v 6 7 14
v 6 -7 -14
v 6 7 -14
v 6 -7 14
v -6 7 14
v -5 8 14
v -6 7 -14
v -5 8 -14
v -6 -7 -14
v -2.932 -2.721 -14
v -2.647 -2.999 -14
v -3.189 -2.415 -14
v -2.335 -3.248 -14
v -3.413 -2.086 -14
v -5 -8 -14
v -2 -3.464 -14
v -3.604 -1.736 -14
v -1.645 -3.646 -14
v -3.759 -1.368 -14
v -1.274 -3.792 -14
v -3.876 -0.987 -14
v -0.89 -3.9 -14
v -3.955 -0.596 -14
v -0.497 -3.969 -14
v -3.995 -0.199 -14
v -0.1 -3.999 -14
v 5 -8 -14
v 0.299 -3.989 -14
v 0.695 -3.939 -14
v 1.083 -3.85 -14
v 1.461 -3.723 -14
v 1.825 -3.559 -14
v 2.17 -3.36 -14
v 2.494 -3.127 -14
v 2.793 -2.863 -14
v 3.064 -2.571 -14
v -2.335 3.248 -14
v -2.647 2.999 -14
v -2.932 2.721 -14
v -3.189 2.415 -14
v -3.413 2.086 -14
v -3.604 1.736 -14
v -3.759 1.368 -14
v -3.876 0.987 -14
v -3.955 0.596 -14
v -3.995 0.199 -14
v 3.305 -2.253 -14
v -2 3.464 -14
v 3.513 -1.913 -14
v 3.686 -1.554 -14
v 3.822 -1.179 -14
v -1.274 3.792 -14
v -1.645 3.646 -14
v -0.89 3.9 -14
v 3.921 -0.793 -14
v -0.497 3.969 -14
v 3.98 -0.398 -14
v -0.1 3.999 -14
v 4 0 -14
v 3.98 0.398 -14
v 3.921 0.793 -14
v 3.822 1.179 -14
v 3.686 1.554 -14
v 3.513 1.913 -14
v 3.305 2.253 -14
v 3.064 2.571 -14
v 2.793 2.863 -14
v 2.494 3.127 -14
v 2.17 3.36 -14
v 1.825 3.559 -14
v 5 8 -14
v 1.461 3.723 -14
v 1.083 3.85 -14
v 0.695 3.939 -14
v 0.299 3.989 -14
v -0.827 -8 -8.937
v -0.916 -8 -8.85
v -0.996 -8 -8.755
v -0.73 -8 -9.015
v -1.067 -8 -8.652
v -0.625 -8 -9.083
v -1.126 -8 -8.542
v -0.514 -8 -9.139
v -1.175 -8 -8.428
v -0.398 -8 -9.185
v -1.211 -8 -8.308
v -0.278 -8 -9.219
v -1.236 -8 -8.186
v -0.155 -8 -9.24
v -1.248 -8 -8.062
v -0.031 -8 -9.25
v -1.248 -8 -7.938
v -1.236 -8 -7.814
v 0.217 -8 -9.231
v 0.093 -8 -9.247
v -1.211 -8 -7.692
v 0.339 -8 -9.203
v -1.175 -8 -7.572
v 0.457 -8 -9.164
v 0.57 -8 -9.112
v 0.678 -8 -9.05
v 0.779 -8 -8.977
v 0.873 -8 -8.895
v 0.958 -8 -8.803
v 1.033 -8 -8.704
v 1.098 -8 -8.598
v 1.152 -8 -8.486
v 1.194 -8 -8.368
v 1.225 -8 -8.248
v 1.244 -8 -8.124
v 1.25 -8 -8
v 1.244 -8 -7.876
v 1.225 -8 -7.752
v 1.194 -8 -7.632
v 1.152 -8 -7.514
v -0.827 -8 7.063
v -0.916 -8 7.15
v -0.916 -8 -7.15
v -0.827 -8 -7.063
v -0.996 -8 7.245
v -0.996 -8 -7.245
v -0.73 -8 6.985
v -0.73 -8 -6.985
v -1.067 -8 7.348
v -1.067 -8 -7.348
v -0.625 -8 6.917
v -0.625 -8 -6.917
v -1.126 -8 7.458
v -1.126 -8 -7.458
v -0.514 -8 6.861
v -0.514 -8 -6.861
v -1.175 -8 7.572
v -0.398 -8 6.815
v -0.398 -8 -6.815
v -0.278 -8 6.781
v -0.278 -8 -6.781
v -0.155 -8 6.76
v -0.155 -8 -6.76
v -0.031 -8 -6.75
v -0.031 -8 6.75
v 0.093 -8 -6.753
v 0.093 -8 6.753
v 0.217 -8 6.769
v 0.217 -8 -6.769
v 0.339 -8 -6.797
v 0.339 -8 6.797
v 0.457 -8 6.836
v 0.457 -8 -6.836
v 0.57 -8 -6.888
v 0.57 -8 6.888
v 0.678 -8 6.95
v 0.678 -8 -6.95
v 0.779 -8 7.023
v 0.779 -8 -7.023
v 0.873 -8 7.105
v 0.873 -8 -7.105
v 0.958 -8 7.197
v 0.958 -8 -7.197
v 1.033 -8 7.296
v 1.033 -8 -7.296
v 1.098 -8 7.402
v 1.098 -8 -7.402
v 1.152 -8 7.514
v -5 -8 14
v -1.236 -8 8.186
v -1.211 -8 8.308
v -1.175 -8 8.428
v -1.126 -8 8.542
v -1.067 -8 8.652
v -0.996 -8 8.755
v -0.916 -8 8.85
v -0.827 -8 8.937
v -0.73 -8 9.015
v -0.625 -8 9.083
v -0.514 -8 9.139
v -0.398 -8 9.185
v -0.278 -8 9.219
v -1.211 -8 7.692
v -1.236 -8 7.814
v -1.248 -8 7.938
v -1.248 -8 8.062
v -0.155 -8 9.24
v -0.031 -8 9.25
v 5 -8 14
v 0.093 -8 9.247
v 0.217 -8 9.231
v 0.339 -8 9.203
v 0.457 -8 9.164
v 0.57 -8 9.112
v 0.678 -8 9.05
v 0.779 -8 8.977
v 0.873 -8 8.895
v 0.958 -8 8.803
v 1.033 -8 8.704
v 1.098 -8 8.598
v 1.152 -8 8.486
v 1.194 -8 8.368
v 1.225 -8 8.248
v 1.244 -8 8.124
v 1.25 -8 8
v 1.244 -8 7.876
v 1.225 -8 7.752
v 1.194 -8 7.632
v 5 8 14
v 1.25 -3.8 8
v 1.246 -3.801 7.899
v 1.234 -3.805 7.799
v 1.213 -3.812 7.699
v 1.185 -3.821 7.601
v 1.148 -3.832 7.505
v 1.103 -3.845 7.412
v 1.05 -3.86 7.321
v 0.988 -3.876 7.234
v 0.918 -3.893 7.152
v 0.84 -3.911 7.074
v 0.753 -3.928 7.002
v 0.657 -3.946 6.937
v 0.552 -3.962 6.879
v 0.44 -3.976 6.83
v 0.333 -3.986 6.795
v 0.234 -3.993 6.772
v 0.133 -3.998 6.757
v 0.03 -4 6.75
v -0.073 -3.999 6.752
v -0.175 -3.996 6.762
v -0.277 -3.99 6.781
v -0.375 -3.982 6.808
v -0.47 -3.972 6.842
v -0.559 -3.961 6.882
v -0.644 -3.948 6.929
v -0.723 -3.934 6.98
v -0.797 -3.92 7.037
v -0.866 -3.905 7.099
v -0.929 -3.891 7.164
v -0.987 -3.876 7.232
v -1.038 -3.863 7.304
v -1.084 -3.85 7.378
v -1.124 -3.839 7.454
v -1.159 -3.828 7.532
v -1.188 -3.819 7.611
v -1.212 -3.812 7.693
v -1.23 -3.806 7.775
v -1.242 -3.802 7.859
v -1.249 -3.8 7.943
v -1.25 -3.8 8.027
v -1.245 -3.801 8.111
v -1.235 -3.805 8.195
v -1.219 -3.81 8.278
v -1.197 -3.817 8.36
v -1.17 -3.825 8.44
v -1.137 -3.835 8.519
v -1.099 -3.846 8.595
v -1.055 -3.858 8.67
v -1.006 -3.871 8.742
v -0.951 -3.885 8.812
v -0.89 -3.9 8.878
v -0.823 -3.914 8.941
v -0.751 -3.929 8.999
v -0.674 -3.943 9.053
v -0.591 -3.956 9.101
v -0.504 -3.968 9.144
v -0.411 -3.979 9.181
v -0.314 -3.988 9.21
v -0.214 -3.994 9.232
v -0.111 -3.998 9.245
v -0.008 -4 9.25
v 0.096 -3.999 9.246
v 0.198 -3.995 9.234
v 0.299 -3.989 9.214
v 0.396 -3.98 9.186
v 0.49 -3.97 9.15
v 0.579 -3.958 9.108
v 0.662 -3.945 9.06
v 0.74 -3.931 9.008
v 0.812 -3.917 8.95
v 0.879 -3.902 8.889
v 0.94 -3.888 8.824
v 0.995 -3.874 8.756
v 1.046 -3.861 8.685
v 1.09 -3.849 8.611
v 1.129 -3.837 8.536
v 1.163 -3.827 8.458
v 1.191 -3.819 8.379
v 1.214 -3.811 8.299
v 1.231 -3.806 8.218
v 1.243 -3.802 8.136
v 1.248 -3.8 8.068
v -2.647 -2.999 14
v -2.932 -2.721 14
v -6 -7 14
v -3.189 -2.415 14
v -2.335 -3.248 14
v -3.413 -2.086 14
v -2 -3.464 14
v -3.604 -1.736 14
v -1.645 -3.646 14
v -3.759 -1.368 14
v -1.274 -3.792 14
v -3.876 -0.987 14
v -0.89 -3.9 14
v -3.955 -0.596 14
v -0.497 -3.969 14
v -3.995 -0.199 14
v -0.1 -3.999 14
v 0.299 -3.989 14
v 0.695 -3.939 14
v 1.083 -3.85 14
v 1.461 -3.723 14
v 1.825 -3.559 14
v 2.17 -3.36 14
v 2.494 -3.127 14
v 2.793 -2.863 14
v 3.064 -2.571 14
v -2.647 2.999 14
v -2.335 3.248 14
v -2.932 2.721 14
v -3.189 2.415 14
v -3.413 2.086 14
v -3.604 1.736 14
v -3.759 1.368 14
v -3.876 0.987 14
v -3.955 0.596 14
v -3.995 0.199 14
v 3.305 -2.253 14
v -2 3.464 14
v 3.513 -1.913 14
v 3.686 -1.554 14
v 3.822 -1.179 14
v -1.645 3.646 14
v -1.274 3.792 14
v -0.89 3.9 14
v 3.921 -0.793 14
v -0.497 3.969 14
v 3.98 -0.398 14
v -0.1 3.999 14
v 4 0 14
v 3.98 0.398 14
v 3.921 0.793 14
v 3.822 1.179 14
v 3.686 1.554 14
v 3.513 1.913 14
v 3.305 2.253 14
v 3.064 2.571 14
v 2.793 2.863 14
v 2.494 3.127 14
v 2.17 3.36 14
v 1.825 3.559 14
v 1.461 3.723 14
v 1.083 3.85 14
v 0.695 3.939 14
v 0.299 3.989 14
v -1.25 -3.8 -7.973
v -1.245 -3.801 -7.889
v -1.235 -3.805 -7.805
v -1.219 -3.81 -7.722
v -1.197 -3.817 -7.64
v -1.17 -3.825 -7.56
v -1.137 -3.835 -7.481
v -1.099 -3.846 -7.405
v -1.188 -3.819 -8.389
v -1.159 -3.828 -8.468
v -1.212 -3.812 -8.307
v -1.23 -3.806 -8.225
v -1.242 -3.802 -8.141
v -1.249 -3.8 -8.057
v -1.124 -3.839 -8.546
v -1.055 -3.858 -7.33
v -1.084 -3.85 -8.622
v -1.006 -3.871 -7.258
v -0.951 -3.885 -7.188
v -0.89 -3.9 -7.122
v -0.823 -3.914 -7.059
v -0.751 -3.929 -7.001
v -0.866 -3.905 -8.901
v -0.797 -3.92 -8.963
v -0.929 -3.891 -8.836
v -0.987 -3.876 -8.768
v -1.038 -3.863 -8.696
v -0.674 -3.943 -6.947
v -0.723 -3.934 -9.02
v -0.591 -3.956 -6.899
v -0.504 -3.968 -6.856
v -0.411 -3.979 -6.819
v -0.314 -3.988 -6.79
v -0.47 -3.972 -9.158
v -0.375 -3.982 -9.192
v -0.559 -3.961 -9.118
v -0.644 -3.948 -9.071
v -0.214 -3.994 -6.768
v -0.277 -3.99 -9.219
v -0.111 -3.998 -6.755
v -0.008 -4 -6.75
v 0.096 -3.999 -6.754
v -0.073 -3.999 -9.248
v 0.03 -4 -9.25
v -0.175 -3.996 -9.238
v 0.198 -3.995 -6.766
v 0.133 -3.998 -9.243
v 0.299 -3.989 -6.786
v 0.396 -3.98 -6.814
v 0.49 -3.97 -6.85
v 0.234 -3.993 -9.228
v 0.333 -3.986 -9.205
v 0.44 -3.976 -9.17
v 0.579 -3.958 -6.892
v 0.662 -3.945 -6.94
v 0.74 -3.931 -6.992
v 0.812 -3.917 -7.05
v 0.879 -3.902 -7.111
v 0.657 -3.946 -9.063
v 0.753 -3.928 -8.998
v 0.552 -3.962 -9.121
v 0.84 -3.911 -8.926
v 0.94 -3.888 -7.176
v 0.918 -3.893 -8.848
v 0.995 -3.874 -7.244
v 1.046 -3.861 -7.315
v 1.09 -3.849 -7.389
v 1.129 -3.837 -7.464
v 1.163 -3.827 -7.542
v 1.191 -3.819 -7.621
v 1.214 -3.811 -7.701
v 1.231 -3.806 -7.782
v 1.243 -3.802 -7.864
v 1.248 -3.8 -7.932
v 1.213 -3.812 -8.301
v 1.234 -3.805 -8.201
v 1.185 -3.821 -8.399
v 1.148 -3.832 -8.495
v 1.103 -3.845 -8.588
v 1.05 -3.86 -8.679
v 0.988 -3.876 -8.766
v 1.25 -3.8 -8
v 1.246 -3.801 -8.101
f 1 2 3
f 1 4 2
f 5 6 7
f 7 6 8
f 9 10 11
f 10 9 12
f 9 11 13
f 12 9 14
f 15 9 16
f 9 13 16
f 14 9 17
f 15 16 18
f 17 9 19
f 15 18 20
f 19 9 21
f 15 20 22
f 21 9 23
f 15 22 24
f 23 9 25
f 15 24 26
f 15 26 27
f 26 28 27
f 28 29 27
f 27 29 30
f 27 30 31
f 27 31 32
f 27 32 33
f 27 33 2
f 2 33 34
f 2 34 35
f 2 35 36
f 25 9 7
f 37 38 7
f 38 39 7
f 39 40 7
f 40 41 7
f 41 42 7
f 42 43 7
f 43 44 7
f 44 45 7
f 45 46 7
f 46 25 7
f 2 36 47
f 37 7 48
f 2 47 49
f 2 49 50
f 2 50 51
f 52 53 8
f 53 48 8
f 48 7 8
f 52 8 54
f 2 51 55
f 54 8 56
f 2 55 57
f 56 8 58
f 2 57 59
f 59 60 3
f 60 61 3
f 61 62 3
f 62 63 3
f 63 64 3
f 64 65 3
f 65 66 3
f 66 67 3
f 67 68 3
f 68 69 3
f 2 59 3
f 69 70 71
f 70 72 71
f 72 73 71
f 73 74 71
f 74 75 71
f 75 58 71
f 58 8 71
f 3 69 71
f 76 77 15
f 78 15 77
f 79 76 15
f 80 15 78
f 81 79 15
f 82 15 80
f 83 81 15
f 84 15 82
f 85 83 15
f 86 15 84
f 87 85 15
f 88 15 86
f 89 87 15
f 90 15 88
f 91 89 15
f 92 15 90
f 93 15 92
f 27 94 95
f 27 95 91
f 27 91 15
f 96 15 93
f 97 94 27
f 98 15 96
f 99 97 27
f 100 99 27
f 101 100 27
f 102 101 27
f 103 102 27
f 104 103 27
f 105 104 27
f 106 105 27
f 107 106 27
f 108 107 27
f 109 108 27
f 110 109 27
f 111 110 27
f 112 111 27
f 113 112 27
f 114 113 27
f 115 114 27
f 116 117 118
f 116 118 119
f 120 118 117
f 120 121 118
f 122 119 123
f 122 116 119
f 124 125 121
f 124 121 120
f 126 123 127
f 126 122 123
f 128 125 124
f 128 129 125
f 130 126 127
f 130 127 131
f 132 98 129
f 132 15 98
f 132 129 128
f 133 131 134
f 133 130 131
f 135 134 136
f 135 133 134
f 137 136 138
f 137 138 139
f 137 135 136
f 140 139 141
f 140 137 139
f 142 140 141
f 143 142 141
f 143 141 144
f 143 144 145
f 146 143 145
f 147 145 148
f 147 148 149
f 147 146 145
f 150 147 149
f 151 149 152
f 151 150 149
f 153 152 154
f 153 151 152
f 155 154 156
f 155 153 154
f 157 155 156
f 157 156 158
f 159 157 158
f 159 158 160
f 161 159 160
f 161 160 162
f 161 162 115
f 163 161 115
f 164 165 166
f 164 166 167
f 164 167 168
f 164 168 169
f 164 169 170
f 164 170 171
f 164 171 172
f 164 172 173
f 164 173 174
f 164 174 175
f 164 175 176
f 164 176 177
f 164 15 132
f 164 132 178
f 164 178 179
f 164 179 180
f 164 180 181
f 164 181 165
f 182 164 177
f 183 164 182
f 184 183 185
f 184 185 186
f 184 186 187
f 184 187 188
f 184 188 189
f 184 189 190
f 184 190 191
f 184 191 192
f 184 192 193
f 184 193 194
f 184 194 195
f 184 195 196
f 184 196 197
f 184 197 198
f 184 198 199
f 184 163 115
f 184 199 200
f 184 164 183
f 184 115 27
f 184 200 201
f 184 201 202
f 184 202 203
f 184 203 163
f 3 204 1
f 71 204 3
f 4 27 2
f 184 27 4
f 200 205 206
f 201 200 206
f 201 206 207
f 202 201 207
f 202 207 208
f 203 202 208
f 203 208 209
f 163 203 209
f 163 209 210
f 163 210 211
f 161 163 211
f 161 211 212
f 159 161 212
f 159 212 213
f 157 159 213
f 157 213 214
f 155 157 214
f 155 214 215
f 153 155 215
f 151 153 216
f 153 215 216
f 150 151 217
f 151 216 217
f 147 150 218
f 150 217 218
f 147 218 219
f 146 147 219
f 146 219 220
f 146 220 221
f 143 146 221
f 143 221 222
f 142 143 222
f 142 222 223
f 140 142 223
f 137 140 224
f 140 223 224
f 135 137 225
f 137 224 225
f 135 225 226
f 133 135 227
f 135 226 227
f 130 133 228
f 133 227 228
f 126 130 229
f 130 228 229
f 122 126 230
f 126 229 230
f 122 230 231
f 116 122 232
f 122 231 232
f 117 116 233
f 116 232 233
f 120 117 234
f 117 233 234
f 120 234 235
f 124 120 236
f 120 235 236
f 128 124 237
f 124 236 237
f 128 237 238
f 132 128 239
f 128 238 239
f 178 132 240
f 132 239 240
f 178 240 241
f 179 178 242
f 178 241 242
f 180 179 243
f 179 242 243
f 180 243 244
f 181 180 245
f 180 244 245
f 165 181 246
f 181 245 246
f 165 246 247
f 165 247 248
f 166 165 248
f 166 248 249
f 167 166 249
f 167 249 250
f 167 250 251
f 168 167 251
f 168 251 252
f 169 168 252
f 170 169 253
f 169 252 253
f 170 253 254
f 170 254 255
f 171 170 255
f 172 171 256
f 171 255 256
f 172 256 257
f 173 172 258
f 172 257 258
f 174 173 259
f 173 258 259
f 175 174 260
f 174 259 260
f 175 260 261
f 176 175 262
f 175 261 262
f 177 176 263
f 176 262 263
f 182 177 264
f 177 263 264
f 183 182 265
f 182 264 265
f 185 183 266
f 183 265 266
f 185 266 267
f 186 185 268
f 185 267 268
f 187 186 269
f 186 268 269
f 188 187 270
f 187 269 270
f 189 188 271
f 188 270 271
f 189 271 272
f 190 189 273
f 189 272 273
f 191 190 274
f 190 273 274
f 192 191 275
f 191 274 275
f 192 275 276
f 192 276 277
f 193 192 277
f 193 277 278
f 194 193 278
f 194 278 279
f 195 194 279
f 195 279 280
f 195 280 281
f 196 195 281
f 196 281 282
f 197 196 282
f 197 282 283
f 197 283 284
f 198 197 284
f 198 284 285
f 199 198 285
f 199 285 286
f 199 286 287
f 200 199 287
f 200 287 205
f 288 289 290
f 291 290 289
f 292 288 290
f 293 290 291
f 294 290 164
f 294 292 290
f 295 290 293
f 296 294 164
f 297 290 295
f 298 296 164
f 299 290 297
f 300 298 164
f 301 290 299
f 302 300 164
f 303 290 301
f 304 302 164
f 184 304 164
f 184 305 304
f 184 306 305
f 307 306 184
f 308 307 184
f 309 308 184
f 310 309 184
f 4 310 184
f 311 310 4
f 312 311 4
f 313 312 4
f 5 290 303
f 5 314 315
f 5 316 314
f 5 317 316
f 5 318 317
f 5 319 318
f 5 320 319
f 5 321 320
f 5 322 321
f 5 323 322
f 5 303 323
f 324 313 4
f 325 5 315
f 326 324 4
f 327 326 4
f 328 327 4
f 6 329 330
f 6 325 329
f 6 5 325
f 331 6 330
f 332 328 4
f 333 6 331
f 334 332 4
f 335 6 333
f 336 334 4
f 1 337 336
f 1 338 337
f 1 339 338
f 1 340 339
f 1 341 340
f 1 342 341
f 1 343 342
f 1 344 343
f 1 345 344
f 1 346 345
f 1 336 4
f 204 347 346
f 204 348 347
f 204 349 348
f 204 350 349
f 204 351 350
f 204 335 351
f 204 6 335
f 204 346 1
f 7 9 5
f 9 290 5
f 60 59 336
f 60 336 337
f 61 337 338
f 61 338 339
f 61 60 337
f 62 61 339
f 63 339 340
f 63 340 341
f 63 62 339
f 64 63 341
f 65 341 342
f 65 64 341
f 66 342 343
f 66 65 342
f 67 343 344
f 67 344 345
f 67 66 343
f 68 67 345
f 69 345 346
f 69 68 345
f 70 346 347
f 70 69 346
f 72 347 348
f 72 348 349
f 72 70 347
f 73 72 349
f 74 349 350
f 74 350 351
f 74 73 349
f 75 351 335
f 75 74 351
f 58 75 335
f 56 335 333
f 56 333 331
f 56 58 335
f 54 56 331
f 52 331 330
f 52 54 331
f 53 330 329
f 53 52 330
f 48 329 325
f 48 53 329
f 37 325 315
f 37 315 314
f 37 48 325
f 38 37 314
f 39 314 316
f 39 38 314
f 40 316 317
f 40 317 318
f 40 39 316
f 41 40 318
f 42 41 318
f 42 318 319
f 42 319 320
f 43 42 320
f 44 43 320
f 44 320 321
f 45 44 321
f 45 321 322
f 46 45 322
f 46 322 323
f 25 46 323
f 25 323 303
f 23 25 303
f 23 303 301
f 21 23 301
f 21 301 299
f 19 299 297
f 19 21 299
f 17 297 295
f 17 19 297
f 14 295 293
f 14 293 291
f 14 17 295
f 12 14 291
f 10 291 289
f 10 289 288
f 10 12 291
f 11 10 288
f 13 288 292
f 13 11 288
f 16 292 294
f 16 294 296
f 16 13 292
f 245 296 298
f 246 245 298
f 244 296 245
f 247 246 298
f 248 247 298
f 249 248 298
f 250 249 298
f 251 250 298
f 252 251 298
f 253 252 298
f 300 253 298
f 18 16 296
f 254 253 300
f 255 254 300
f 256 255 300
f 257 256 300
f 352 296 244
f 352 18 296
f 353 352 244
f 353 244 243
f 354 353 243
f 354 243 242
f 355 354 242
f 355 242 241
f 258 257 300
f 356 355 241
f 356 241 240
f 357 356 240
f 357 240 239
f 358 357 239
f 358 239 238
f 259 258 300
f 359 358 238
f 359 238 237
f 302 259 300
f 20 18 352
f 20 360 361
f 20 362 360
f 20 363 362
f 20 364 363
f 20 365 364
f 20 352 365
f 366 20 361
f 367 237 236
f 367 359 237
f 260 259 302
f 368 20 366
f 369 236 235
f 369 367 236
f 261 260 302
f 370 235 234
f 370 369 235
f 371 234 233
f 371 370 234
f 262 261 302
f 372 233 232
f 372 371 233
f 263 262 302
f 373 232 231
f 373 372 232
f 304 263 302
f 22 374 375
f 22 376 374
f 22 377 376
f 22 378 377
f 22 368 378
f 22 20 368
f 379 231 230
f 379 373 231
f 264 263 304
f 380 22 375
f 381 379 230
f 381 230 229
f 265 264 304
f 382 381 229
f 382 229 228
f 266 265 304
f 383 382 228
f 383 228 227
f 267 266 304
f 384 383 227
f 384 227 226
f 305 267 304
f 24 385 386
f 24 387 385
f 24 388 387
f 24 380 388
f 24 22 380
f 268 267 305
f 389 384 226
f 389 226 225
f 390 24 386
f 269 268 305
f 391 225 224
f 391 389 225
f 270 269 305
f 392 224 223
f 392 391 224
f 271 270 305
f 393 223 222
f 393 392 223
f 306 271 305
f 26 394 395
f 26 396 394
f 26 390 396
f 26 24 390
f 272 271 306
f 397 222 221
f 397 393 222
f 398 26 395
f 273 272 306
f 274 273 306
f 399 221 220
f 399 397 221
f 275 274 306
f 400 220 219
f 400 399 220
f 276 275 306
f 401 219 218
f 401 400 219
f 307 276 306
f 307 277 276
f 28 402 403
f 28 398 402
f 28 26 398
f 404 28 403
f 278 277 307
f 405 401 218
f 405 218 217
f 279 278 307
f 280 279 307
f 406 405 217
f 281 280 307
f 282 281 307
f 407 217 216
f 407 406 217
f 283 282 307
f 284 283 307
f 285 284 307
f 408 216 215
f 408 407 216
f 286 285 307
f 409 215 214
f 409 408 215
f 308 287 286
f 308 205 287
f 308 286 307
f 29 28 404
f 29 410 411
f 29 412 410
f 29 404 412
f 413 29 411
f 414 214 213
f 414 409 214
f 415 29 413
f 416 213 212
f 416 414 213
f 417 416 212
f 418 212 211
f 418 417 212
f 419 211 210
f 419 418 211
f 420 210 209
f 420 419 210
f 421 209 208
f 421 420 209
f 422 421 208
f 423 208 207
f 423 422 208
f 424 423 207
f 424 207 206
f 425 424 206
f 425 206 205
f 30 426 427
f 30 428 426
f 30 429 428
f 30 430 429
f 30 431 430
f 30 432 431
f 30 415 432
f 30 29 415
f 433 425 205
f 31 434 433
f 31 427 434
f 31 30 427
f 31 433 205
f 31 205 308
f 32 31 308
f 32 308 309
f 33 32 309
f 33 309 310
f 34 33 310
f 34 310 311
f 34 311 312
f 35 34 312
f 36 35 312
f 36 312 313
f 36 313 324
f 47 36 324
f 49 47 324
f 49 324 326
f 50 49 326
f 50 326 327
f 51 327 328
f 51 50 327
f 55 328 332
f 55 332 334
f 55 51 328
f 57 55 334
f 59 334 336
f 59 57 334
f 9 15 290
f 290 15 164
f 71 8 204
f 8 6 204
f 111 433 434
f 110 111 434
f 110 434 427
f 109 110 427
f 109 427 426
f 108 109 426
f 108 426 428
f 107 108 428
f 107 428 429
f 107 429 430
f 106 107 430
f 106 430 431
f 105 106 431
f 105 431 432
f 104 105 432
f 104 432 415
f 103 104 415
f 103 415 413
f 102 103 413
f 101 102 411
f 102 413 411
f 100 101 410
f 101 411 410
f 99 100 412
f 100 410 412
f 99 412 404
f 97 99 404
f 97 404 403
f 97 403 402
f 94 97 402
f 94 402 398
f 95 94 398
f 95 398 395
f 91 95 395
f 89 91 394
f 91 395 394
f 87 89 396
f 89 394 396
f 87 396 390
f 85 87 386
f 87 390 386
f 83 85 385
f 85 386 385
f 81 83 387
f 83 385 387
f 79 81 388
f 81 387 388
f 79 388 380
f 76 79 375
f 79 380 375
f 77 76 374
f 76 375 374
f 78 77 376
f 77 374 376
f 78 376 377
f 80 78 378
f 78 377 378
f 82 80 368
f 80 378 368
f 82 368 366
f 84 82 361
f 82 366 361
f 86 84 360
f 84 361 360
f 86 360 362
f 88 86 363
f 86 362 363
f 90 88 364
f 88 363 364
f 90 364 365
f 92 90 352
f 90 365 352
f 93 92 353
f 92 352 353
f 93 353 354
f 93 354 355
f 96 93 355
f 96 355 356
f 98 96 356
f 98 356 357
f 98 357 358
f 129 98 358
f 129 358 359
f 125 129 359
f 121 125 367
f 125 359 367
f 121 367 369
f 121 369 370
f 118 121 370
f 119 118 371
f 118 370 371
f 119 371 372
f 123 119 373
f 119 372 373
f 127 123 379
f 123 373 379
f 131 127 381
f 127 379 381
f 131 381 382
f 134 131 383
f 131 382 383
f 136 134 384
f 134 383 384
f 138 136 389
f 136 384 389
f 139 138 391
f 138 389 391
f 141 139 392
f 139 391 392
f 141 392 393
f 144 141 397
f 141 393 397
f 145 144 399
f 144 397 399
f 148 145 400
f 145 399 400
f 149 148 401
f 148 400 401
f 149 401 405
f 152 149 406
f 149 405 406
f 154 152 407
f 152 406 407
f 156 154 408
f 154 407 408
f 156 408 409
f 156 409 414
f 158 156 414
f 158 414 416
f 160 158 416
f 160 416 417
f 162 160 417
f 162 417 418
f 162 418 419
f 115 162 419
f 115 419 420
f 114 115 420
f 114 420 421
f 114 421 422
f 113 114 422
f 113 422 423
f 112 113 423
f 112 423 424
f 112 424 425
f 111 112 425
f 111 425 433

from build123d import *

# Parameters (mm, degrees)
ESQUISSE1_W           = 12
ESQUISSE1_H           = 16
ESQUISSE1_R           = 4
BOSS_EXTRU_1_DEPTH    = 14
CHANFREIN1_SIZE       = 1
TROU_TARAUD_M31_D     = 2.5
TROU_TARAUD_M31_DEPTH = 8.5
TROU_TARAUD_M31_TIP   = 0.751075774


with BuildPart() as part:
    # Esquisse1 → Boss.-Extru.1 (new, symmetric)
    with BuildSketch(Plane.XY):
        Rectangle(ESQUISSE1_W, ESQUISSE1_H)
        Circle(ESQUISSE1_R, mode=Mode.SUBTRACT)
    extrude(amount=BOSS_EXTRU_1_DEPTH, both=True)

    # Chanfrein1
    chanfrein1_edges = [part.edges().sort_by_distance(p)[0] for p in [
        (-6, 8, 0),
        (6, 8, 0),
        (6, -8, 0),
        (-6, -8, 0),
    ]]
    chamfer(chanfrein1_edges, length=CHANFREIN1_SIZE)

    # Trou taraudé M31
    with Locations(Plane(origin=(0, -8, 0), x_dir=(-1, 0, 0), z_dir=(0, -1, 0))):
        with Locations((0, 8), (0, -8)):
            Hole(TROU_TARAUD_M31_D / 2, depth=TROU_TARAUD_M31_DEPTH)
            with Locations((0, 0, -(TROU_TARAUD_M31_DEPTH + TROU_TARAUD_M31_TIP / 2))):  # 118° drill point
                Cone(0, TROU_TARAUD_M31_D / 2, TROU_TARAUD_M31_TIP, mode=Mode.SUBTRACT)


solid = part.part
